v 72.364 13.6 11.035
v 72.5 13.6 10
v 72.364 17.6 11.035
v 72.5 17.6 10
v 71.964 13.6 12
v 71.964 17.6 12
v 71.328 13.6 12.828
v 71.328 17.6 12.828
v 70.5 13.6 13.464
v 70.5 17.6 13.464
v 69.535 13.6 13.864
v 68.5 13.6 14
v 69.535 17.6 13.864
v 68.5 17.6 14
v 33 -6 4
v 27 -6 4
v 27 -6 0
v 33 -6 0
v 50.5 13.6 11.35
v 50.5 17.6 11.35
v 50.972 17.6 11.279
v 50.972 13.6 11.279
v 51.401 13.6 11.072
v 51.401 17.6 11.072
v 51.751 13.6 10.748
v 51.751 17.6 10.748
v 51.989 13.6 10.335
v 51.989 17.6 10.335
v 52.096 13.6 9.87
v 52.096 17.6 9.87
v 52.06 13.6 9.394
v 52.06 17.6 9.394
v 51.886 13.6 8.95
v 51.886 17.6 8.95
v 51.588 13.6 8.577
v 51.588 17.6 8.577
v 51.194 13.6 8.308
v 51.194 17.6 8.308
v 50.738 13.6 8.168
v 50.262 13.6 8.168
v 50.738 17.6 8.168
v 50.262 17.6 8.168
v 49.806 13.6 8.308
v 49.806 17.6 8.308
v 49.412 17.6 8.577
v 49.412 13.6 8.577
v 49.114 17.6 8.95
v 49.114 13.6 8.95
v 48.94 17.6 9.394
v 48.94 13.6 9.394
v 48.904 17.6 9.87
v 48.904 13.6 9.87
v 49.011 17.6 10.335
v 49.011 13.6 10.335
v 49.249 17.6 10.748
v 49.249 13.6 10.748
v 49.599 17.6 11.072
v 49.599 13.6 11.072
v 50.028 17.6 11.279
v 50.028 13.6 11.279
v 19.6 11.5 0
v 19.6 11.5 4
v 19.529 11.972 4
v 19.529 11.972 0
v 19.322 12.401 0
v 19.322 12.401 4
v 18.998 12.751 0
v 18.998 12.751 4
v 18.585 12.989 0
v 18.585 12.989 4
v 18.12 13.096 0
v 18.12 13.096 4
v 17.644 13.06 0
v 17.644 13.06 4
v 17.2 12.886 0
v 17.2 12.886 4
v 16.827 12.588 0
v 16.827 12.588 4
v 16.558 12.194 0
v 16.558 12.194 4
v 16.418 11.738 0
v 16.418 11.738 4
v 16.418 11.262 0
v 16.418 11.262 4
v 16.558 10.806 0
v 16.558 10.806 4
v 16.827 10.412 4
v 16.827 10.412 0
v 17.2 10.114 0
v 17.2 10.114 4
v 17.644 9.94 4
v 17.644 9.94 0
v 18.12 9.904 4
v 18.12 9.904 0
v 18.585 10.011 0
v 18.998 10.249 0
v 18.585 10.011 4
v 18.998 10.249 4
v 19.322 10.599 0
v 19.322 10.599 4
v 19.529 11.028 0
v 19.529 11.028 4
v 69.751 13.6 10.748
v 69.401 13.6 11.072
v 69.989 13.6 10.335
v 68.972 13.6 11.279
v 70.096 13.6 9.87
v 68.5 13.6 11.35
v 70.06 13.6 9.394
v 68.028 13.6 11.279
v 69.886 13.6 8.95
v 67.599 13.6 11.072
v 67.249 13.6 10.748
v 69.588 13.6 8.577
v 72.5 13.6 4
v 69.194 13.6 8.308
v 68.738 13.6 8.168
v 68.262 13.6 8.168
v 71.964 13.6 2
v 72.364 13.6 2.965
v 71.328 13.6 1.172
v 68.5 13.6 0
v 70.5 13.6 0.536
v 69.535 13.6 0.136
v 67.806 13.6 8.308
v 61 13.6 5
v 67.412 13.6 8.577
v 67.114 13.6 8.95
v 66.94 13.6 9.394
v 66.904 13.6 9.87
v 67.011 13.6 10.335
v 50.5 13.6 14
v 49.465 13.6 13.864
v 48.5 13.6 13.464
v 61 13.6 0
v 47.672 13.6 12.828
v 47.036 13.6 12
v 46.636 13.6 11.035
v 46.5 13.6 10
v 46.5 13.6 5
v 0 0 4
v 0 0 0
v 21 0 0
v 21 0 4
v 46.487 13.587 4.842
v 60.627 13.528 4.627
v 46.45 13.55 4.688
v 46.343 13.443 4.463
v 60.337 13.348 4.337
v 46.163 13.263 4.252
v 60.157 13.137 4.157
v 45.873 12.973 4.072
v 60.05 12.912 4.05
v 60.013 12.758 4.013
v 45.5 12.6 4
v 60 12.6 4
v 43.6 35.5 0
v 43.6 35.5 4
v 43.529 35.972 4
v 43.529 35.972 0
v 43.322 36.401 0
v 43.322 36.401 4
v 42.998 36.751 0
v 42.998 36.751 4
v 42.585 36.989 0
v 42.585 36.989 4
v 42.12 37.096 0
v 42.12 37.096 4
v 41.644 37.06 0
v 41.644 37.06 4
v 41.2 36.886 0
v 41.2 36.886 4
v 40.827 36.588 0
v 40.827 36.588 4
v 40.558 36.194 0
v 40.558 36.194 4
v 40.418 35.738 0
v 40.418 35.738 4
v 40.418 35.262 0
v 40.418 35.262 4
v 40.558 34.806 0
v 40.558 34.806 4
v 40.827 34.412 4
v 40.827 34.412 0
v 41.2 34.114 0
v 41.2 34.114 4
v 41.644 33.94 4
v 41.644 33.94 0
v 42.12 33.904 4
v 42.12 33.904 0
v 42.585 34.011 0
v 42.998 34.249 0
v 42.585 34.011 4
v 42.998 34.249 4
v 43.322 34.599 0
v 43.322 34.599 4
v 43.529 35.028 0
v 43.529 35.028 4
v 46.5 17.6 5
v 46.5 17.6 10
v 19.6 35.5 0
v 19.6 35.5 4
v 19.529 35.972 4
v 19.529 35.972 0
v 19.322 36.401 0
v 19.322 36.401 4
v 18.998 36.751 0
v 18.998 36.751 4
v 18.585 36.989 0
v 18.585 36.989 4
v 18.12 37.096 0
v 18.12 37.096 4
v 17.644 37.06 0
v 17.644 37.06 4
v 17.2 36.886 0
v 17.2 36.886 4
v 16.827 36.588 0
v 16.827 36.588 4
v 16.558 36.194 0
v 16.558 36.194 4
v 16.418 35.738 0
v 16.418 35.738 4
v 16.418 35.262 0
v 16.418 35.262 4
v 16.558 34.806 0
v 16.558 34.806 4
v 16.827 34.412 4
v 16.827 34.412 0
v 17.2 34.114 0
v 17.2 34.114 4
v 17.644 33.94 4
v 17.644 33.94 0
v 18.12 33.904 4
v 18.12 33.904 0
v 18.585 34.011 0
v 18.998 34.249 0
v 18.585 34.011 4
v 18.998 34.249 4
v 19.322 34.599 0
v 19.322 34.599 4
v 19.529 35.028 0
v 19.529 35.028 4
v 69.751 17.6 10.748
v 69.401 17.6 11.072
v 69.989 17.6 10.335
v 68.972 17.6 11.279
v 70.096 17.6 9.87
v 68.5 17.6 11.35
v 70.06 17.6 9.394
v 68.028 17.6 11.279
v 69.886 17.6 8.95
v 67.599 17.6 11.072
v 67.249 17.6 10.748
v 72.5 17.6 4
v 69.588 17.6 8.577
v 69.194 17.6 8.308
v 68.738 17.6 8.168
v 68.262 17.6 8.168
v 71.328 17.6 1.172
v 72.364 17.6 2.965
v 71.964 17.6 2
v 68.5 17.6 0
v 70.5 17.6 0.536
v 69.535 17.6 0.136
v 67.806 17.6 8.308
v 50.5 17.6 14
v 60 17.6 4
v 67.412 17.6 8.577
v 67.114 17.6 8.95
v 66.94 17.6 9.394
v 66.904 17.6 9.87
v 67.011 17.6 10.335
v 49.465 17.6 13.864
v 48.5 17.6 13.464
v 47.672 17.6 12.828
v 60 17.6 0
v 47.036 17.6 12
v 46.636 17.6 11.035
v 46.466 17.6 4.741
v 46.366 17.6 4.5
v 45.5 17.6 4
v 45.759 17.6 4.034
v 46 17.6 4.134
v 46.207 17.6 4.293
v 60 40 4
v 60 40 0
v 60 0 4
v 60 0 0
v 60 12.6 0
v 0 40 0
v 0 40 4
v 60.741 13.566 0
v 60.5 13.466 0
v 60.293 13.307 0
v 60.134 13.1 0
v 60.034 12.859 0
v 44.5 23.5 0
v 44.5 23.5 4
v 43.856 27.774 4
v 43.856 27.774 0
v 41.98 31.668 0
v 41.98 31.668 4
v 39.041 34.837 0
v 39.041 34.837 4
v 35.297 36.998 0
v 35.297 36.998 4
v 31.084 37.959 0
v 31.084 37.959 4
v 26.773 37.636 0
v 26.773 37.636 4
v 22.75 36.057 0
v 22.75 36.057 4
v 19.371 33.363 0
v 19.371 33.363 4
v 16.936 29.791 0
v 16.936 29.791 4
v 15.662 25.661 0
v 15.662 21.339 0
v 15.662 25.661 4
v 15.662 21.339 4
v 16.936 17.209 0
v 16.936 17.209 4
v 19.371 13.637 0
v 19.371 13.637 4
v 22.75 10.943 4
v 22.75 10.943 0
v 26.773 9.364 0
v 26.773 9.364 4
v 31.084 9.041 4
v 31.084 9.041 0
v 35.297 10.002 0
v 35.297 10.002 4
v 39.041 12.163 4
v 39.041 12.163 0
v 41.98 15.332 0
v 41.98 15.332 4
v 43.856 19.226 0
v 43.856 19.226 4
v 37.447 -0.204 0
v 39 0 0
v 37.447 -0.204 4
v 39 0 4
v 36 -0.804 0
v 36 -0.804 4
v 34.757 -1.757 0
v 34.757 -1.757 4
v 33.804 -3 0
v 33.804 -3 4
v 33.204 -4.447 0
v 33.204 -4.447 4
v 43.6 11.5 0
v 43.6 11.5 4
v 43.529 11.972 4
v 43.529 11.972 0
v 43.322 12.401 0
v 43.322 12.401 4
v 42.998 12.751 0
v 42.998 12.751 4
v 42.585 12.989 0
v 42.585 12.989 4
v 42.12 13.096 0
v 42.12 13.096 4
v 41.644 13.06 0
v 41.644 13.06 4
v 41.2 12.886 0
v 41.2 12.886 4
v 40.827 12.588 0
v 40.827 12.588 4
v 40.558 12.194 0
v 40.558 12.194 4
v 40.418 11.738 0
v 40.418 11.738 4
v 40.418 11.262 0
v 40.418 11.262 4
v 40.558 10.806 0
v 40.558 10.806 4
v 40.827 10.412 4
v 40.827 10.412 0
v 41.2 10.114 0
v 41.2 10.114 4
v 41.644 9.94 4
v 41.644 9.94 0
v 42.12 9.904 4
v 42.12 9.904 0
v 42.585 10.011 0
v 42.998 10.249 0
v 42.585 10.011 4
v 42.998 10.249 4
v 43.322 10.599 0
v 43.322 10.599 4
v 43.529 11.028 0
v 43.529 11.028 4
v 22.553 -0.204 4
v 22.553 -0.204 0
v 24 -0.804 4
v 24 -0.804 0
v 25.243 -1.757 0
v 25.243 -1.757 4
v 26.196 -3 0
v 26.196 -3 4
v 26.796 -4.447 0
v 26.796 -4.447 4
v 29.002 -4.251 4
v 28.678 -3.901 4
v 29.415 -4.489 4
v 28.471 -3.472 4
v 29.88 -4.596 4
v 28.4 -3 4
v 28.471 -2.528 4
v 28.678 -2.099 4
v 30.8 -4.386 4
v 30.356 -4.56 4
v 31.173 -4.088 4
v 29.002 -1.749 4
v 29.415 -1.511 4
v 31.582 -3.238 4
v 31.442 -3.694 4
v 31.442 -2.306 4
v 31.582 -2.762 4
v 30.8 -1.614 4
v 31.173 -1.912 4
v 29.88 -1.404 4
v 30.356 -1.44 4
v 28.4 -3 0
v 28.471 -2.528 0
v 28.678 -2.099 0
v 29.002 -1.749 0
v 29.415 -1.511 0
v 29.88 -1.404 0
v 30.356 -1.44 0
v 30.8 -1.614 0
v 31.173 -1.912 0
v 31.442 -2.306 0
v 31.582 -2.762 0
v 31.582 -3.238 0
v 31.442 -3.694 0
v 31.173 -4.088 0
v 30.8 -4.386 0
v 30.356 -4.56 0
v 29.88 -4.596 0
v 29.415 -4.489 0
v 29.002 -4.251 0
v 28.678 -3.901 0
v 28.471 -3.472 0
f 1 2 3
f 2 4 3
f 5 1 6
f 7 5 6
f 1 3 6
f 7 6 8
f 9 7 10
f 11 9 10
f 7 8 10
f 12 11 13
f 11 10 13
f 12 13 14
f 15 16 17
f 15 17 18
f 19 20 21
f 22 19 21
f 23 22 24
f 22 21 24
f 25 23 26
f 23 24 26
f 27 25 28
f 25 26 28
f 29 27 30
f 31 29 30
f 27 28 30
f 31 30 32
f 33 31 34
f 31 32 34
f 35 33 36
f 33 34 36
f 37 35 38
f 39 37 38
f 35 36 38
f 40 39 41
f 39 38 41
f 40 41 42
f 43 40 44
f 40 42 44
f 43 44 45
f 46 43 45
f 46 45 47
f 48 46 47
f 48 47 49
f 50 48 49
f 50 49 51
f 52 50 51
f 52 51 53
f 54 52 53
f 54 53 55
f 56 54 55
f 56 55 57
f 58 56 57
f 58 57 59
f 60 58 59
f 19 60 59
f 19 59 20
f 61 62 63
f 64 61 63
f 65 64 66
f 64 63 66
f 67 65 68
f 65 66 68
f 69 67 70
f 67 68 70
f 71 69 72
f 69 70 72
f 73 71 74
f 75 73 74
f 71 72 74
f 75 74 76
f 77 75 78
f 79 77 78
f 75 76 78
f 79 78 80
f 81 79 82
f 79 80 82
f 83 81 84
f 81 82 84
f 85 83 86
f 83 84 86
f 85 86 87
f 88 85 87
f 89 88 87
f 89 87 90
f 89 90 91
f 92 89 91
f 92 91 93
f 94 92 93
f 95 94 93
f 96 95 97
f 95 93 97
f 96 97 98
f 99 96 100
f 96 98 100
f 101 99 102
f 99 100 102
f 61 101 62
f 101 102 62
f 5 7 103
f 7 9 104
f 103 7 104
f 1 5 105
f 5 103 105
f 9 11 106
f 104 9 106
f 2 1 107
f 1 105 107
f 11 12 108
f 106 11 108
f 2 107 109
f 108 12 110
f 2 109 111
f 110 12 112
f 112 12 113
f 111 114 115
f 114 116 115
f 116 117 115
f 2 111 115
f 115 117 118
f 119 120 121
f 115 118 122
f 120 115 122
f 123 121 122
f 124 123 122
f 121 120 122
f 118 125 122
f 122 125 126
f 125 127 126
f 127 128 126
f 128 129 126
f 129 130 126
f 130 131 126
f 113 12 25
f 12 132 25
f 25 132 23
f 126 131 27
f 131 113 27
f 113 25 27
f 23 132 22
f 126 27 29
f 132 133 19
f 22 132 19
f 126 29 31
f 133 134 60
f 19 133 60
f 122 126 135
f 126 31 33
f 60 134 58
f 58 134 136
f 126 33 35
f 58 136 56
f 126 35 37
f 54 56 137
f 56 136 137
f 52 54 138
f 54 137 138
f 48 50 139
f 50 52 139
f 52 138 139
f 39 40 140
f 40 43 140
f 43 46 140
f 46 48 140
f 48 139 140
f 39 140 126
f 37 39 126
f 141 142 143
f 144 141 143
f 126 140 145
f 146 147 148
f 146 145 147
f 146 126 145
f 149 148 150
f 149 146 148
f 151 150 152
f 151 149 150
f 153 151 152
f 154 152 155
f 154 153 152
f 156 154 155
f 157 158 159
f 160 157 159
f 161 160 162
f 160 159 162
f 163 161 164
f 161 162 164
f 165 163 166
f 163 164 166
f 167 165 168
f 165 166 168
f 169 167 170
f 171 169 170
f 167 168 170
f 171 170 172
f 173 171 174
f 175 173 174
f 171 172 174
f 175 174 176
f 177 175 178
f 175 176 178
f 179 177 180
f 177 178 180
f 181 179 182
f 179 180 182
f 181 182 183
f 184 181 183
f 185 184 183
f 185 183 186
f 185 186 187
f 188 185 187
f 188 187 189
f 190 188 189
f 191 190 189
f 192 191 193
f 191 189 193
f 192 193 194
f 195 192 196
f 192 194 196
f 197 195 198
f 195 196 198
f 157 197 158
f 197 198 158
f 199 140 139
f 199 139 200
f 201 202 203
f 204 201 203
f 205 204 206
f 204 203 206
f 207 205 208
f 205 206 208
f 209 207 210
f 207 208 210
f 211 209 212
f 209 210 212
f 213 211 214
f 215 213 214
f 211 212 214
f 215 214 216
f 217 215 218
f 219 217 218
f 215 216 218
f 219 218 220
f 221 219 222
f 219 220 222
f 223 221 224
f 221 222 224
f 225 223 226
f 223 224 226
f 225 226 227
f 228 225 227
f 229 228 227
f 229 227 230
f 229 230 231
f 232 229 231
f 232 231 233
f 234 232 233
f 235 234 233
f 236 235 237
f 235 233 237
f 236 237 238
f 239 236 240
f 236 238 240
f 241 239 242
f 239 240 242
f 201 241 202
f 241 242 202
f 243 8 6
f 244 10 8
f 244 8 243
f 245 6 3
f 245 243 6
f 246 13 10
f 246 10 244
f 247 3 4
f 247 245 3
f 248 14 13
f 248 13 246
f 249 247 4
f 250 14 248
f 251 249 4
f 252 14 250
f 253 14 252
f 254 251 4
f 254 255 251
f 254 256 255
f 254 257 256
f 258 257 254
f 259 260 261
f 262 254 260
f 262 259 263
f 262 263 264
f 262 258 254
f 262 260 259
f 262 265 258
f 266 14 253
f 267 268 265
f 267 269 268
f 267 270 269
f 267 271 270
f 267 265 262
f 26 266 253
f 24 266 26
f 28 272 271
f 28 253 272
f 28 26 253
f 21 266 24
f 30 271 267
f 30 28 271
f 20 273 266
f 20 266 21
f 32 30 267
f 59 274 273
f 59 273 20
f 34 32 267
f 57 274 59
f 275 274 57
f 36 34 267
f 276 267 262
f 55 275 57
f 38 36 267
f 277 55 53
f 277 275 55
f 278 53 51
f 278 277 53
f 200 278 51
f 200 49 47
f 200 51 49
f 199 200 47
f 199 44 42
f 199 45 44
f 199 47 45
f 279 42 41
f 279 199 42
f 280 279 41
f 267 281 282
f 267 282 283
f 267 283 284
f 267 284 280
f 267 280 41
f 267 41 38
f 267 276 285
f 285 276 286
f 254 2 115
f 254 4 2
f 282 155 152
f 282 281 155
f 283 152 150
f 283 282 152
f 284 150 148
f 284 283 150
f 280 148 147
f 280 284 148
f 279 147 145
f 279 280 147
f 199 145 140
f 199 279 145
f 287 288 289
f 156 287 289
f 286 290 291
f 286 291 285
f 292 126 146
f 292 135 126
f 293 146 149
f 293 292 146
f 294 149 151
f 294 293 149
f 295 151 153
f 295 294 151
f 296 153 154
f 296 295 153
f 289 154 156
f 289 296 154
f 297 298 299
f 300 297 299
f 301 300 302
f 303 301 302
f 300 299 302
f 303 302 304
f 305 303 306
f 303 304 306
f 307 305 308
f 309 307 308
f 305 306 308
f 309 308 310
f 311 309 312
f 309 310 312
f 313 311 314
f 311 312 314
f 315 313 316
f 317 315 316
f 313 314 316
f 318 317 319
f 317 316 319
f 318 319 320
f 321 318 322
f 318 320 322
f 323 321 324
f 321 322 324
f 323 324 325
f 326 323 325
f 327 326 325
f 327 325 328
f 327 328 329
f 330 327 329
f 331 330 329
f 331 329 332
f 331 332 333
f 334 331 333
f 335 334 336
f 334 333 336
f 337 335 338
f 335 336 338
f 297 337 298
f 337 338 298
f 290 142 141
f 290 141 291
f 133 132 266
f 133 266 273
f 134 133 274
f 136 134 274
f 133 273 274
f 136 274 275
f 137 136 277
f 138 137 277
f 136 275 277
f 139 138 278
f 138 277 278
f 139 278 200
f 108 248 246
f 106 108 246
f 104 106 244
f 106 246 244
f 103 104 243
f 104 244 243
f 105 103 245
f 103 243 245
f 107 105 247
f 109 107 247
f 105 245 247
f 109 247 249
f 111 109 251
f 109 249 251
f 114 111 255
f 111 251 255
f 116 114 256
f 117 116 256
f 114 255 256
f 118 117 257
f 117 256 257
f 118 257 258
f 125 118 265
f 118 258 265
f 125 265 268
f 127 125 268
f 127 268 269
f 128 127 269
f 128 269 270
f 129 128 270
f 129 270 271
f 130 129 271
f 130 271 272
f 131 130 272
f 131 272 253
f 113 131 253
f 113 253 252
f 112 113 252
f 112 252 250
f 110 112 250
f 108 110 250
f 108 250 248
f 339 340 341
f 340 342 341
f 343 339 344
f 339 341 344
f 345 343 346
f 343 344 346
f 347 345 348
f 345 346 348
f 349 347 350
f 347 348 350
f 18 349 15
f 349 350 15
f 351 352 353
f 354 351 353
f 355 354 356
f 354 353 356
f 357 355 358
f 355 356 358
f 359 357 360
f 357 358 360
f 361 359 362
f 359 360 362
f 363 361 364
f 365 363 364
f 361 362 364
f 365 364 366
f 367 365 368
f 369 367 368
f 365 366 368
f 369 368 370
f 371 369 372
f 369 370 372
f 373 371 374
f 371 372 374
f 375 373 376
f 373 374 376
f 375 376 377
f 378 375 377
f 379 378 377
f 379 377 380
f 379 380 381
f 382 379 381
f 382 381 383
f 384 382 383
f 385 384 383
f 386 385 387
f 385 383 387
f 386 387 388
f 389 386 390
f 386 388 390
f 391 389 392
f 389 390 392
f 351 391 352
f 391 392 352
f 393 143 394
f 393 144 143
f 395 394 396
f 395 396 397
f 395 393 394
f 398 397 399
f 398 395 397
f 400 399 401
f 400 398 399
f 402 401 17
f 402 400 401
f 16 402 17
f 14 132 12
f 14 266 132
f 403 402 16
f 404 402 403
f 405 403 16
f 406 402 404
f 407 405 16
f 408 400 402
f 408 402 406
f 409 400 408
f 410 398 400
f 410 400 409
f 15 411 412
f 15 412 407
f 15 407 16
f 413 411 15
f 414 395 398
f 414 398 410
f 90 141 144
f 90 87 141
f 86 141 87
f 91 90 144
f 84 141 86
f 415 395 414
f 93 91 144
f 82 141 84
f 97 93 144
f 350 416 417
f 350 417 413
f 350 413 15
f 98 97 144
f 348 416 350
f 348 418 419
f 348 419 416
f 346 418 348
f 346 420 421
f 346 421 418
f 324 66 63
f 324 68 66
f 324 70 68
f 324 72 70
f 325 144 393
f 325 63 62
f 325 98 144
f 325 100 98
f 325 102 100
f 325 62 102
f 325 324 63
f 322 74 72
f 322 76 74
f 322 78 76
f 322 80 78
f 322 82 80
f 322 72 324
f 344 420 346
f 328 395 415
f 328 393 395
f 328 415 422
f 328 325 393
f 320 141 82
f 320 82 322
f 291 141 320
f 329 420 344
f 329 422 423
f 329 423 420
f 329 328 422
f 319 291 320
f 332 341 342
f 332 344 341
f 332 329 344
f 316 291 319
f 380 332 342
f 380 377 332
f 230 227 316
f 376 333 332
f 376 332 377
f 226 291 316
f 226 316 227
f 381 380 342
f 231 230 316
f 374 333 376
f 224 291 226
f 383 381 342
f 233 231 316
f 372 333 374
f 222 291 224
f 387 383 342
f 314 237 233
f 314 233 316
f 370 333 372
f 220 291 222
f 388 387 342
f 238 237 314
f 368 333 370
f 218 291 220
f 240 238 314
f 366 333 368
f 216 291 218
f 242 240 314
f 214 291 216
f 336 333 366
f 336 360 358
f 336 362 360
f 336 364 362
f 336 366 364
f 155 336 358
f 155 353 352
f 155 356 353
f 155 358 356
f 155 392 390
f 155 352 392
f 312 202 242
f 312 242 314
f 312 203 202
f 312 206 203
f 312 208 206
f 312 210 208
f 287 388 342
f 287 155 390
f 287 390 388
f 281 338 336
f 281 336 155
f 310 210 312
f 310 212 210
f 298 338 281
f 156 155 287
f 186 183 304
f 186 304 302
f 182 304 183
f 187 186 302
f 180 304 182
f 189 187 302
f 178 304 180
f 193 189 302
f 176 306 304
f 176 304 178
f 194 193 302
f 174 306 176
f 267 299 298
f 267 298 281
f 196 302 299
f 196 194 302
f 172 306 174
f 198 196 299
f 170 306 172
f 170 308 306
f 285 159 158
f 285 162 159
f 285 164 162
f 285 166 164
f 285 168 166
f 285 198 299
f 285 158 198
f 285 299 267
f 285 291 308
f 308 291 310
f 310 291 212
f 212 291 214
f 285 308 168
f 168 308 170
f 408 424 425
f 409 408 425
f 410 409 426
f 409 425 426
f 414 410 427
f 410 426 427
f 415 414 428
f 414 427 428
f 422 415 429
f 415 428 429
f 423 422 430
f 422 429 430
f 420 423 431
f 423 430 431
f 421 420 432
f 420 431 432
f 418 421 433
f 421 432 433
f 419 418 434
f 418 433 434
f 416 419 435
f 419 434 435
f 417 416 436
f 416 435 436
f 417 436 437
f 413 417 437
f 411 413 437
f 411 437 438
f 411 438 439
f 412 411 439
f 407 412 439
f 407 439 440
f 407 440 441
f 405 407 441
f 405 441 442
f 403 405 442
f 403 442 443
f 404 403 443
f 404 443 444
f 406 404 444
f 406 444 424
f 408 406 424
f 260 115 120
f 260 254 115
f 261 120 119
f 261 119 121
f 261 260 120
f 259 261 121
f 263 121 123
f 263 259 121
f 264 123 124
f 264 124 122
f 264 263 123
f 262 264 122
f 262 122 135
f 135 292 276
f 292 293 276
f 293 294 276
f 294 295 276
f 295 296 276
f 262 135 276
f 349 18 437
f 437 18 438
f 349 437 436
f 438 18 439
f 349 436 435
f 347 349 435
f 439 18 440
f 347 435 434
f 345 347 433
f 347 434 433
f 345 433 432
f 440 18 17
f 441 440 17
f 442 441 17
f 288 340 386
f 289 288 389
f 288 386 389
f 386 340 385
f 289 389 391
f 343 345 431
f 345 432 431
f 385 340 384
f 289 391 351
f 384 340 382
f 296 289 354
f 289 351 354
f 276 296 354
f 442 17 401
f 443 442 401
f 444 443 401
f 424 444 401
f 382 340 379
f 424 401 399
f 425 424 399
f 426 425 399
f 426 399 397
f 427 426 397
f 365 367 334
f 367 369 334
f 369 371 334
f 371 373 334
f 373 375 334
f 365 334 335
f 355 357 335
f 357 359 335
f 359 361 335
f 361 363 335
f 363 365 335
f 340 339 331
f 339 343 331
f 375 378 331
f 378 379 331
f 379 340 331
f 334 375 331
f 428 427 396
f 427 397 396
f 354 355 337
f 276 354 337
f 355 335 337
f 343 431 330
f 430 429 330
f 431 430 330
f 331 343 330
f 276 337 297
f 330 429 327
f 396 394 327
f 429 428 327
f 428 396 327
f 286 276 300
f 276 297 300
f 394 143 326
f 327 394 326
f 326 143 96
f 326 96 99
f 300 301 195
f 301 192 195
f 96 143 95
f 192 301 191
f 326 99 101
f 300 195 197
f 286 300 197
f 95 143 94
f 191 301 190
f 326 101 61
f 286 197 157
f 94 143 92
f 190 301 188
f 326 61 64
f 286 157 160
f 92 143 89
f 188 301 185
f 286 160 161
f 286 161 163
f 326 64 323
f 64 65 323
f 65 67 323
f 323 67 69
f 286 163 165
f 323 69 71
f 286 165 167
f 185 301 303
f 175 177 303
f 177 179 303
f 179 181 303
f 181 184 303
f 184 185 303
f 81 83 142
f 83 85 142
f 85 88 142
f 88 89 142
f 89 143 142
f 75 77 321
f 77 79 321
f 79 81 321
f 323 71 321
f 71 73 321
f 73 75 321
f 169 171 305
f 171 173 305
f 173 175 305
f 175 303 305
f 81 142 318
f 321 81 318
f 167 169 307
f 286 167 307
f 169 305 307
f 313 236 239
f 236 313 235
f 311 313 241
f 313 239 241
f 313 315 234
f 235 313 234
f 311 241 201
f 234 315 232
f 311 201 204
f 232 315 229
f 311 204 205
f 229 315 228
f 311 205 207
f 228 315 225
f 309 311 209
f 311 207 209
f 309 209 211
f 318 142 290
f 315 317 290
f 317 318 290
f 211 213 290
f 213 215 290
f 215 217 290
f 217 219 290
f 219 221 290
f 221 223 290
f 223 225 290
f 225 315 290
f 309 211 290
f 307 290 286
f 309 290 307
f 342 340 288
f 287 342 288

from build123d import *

# Parameters (mm, degrees)
SKETCH1_W                  = 60
SKETCH1_H                  = 40
BOSS_EXTRUDE1_DEPTH        = 4
SKETCH4_R                  = 14.5
CUT_EXTRUDE1_DEPTH         = 4
SKETCH6_R                  = 1.6
CUT_EXTRUDE2_DEPTH         = 4
SKETCH7_W                  = 26
SKETCH7_H                  = 4
BOSS_EXTRUDE3_DEPTH        = 10
SKETCH8_R                  = 1.6
CUT_EXTRUDE3_DEPTH         = 78.162231694
SKETCH9_W                  = 4
SKETCH9_H                  = 4
BOSS_EXTRUDE4_DEPTH        = 12.5
FILLET2_R                  = 4
FILLET3_R                  = 1
SKETCH10_W                 = 6
SKETCH10_H                 = 4
BOSS_EXTRUDE5_DEPTH        = 6
FILLET4_R                  = 6
F_3_2_3_2_DIAMETER_HOLE1_D = 3.2


with BuildPart() as part:
    # Sketch1 → Boss-Extrude1 (new body)
    with BuildSketch(Plane.XY):
        with Locations((30, 20)):
            Rectangle(SKETCH1_W, SKETCH1_H)
    extrude(amount=BOSS_EXTRUDE1_DEPTH)

    # Sketch4 → Cut-Extrude1 (cut)
    with BuildSketch(Plane.XY.offset(4)):
        with Locations((30, 23.5)):
            Circle(SKETCH4_R)
    extrude(amount=-CUT_EXTRUDE1_DEPTH, mode=Mode.SUBTRACT)

    # Sketch6 → Cut-Extrude2 (cut)
    with BuildSketch(Plane.XY.offset(4)):
        with Locations((42, 11.5)):
            Circle(SKETCH6_R)
        with Locations((18, 11.5)):
            Circle(SKETCH6_R)
        with Locations((18, 35.5)):
            Circle(SKETCH6_R)
        with Locations((42, 35.5)):
            Circle(SKETCH6_R)
    extrude(amount=-CUT_EXTRUDE2_DEPTH, mode=Mode.SUBTRACT)

    # Sketch7 → Boss-Extrude3 (add)
    with BuildSketch(Plane.XY.offset(4)):
        with Locations((59.5, 15.6)):
            Rectangle(SKETCH7_W, SKETCH7_H)
    extrude(amount=BOSS_EXTRUDE3_DEPTH)

    # Sketch8 → Cut-Extrude3 (cut, through all)
    with BuildSketch(Plane(origin=(0, 17.6, 0), x_dir=(1, 0, 0), z_dir=(0, 1, 0))):
        with Locations(Location((68.5, -9.75, 0), (0, 0, 270))):
            Circle(SKETCH8_R)
        with Locations(Location((50.5, -9.75, 0), (0, 0, 270))):
            Circle(SKETCH8_R)
    extrude(amount=-CUT_EXTRUDE3_DEPTH, mode=Mode.SUBTRACT)

    # Sketch9 → Boss-Extrude4 (add)
    with BuildSketch(Plane(origin=(60, 0, 0), x_dir=(0, 0, -1), z_dir=(1, 0, 0))):
        with Locations((-2, 15.6)):
            Rectangle(SKETCH9_W, SKETCH9_H)
    extrude(amount=BOSS_EXTRUDE4_DEPTH)

    # Fillet2
    fillet2_edges = [part.edges().sort_by_distance(p)[0] for p in [
        (46.5, 15.6, 14),
        (72.5, 15.6, 14),
        (72.5, 15.6, 0),
    ]]
    fillet(fillet2_edges, radius=FILLET2_R)

    # Fillet3
    fillet3_edges = [part.edges().sort_by_distance(p)[0] for p in [
        (46.5, 15.6, 4),
        (53.25, 13.6, 4),
        (60, 13.6, 2),
    ]]
    fillet(fillet3_edges, radius=FILLET3_R)

    # Sketch10 → Boss-Extrude5 (add)
    with BuildSketch(Plane.XZ):
        with Locations((30, 2)):
            Rectangle(SKETCH10_W, SKETCH10_H)
    extrude(amount=BOSS_EXTRUDE5_DEPTH)

    # Fillet4
    fillet4_edges = [part.edges().sort_by_distance(p)[0] for p in [
        (27, 0, 2),
        (33, 0, 2),
    ]]
    fillet(fillet4_edges, radius=FILLET4_R - 0.0001)  # a hair under: the kernel refuses the full size

    # Ø3.2 (3.2) Diameter Hole1 (through all)
    with Locations(Plane.XY.offset(4)):
        with Locations((30, -3)):
            Hole(F_3_2_3_2_DIAMETER_HOLE1_D / 2)


solid = part.part
